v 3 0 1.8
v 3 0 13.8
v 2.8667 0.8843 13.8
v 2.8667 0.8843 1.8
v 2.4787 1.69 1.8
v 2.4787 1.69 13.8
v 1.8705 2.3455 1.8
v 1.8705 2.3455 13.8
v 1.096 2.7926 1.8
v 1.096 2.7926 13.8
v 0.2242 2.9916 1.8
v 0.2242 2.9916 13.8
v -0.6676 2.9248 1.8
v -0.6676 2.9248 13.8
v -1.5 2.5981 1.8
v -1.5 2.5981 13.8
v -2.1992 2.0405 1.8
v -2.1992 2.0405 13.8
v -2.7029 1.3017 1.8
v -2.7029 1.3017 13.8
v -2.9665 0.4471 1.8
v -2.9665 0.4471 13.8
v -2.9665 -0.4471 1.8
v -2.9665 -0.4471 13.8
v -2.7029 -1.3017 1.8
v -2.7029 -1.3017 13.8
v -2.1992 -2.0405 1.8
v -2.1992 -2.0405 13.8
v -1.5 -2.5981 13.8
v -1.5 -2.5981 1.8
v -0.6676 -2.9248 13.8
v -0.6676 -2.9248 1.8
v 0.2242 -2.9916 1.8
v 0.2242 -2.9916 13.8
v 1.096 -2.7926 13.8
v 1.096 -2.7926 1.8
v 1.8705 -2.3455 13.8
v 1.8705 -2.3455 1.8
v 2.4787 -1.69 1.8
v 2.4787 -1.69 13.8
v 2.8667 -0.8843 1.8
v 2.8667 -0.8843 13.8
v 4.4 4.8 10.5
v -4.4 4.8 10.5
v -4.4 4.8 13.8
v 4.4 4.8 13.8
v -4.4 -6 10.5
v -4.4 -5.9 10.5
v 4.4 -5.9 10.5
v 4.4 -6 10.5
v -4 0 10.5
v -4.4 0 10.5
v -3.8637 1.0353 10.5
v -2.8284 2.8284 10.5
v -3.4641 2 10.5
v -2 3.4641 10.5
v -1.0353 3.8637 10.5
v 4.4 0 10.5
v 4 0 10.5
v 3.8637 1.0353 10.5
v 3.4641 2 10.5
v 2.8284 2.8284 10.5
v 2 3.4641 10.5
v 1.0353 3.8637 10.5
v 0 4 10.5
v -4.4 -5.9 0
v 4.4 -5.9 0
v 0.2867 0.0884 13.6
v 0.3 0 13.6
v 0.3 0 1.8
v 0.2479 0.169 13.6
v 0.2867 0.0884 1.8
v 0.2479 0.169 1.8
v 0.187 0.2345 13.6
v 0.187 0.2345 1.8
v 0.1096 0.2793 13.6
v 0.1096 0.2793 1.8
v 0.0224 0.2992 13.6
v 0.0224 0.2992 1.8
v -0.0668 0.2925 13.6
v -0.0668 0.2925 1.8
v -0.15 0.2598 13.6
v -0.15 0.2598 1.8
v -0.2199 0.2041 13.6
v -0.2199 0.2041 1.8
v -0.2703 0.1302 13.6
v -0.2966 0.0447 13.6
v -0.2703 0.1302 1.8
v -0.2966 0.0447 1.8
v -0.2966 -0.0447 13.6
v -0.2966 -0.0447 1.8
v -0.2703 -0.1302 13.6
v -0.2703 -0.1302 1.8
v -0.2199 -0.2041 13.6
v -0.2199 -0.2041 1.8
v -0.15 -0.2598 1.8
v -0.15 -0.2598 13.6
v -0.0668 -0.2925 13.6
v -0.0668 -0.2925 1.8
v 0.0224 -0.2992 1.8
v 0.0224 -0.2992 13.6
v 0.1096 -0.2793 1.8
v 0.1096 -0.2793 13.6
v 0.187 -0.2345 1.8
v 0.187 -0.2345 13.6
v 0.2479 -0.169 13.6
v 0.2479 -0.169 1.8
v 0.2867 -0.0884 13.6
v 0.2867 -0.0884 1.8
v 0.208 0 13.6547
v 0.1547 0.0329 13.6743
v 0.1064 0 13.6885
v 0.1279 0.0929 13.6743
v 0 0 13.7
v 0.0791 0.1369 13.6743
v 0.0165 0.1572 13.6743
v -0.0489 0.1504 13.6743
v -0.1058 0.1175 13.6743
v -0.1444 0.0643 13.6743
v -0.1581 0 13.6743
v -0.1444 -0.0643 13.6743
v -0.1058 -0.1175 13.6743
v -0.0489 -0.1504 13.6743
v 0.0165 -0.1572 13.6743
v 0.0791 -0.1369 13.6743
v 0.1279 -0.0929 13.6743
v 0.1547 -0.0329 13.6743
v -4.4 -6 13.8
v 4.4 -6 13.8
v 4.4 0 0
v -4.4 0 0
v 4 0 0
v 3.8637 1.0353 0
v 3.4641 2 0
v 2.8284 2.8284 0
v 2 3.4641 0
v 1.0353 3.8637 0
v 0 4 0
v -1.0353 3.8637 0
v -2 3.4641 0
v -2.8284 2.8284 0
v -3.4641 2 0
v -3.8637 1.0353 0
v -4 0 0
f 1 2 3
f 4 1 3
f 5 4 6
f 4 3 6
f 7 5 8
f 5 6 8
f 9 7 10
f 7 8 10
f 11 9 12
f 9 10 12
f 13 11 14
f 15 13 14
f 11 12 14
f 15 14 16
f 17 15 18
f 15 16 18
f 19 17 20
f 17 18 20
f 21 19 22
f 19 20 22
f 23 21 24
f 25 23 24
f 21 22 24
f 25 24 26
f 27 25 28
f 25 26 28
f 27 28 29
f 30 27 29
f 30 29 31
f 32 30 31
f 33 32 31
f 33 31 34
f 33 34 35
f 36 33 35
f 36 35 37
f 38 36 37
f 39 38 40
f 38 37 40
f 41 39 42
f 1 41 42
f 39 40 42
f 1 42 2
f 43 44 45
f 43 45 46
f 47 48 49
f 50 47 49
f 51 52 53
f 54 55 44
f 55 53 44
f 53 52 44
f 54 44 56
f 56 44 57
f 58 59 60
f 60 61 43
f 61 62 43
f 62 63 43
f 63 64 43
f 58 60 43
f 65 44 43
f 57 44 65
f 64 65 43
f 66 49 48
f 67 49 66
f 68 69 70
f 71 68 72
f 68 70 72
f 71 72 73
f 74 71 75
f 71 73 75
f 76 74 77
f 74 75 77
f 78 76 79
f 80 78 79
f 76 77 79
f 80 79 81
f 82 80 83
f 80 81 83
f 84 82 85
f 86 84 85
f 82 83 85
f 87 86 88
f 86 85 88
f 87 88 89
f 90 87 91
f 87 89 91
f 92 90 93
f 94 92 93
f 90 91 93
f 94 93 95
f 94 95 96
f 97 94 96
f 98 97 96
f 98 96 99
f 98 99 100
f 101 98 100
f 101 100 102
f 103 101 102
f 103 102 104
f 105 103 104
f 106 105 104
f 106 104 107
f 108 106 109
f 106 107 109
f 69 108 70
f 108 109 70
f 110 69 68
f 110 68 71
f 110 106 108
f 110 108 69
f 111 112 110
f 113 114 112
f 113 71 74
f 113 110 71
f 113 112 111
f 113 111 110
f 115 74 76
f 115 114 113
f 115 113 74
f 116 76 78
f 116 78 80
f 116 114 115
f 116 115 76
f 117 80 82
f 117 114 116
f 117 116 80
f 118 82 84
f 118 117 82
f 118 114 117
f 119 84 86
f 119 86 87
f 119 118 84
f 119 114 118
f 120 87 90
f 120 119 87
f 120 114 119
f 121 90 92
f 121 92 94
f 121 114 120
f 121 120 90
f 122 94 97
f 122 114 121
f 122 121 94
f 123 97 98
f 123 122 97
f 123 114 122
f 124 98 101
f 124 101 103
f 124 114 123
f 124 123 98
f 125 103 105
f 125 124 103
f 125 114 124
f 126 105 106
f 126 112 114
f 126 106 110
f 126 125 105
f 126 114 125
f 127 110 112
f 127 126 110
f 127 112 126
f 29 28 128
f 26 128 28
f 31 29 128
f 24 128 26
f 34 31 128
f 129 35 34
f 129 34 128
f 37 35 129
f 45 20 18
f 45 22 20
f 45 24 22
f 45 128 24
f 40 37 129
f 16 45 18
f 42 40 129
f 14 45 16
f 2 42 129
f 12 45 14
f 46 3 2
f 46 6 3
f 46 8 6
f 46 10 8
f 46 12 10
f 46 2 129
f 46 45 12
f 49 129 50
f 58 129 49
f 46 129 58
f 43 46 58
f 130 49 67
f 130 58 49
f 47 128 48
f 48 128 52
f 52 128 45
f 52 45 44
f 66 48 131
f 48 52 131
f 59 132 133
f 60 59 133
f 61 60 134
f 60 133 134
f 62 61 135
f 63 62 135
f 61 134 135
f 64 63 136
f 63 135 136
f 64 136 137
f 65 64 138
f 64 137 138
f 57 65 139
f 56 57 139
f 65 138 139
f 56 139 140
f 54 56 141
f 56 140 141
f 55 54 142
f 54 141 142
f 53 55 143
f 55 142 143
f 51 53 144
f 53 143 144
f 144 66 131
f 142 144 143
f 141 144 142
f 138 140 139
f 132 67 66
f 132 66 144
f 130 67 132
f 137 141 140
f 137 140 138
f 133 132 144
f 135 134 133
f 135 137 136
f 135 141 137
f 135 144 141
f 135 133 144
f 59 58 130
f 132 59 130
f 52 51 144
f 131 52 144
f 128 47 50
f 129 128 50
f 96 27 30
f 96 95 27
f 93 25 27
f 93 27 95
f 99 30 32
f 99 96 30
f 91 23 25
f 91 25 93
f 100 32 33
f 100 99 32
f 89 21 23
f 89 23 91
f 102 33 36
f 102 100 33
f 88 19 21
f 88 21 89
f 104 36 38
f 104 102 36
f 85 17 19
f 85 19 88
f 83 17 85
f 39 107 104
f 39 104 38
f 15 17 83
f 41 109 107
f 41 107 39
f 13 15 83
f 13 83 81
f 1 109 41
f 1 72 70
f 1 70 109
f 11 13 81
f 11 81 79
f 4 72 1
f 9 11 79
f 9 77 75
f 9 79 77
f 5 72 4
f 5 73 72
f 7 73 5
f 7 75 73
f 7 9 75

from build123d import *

# Parameters (mm, degrees)
ESQUISSE1_R             = 4
BOSS_EXTRU_1_DEPTH      = 10.5
ESQUISSE2_W             = 8.8
ESQUISSE2_H             = 10.8
BOSS_EXTRU_2_DEPTH      = 3.3
ESQUISSE3_W             = 10.5
ESQUISSE3_H             = 5.9
BOSS_EXTRU_3_DEPTH      = 8.8
ESQUISSE4_R             = 3
ENL_V_MAT_EXTRU_1_DEPTH = 12
ESQUISSE5_R             = 0.3
BOSS_EXTRU_4_DEPTH      = 11.8


# Read off the part's stored shape, not the designer's step: Dôme1
with BuildPart() as part:
    # Esquisse1 → Boss.-Extru.1 (new body)
    with BuildSketch(Plane.XY):
        with Locations(Location((0, 0, 0), (0, 0, 180))):
            Circle(ESQUISSE1_R)
    extrude(amount=BOSS_EXTRU_1_DEPTH)

    # Esquisse2 → Boss.-Extru.2 (add)
    with BuildSketch(Plane.XY.offset(10.5)):
        with Locations((0, -0.6)):
            Rectangle(ESQUISSE2_W, ESQUISSE2_H)
    extrude(amount=BOSS_EXTRU_2_DEPTH)

    # Esquisse3 → Boss.-Extru.3 (add)
    with BuildSketch(Plane(origin=(4.4, 0, 0), x_dir=(0, 0, -1), z_dir=(1, 0, 0))):
        with Locations((-5.25, -2.95)):
            Rectangle(ESQUISSE3_W, ESQUISSE3_H)
    extrude(amount=-BOSS_EXTRU_3_DEPTH)

    # Esquisse4 → Enlèv. mat.-Extru.1 (cut)
    with BuildSketch(Plane.XY.offset(13.8)):
        Circle(ESQUISSE4_R)
    extrude(amount=-ENL_V_MAT_EXTRU_1_DEPTH, mode=Mode.SUBTRACT)

    # Esquisse5 → Boss.-Extru.4 (add)
    with BuildSketch(Plane.XY.offset(1.8)):
        Circle(ESQUISSE5_R)
    extrude(amount=BOSS_EXTRU_4_DEPTH)

    # Dôme1 outline → Dôme1 (revolve)
    with BuildSketch(Plane.XZ):
        with BuildLine():
            Line((0, 13.6), (0.3, 13.6))
            ThreePointArc((0.3, 13.6), (0.158113883, 13.674341649), (0, 13.7))
            Line((0, 13.7), (0, 13.6))
        make_face()
    revolve(axis=Axis((0, 0, 0), (0, 0, 1)))


solid = part.part
